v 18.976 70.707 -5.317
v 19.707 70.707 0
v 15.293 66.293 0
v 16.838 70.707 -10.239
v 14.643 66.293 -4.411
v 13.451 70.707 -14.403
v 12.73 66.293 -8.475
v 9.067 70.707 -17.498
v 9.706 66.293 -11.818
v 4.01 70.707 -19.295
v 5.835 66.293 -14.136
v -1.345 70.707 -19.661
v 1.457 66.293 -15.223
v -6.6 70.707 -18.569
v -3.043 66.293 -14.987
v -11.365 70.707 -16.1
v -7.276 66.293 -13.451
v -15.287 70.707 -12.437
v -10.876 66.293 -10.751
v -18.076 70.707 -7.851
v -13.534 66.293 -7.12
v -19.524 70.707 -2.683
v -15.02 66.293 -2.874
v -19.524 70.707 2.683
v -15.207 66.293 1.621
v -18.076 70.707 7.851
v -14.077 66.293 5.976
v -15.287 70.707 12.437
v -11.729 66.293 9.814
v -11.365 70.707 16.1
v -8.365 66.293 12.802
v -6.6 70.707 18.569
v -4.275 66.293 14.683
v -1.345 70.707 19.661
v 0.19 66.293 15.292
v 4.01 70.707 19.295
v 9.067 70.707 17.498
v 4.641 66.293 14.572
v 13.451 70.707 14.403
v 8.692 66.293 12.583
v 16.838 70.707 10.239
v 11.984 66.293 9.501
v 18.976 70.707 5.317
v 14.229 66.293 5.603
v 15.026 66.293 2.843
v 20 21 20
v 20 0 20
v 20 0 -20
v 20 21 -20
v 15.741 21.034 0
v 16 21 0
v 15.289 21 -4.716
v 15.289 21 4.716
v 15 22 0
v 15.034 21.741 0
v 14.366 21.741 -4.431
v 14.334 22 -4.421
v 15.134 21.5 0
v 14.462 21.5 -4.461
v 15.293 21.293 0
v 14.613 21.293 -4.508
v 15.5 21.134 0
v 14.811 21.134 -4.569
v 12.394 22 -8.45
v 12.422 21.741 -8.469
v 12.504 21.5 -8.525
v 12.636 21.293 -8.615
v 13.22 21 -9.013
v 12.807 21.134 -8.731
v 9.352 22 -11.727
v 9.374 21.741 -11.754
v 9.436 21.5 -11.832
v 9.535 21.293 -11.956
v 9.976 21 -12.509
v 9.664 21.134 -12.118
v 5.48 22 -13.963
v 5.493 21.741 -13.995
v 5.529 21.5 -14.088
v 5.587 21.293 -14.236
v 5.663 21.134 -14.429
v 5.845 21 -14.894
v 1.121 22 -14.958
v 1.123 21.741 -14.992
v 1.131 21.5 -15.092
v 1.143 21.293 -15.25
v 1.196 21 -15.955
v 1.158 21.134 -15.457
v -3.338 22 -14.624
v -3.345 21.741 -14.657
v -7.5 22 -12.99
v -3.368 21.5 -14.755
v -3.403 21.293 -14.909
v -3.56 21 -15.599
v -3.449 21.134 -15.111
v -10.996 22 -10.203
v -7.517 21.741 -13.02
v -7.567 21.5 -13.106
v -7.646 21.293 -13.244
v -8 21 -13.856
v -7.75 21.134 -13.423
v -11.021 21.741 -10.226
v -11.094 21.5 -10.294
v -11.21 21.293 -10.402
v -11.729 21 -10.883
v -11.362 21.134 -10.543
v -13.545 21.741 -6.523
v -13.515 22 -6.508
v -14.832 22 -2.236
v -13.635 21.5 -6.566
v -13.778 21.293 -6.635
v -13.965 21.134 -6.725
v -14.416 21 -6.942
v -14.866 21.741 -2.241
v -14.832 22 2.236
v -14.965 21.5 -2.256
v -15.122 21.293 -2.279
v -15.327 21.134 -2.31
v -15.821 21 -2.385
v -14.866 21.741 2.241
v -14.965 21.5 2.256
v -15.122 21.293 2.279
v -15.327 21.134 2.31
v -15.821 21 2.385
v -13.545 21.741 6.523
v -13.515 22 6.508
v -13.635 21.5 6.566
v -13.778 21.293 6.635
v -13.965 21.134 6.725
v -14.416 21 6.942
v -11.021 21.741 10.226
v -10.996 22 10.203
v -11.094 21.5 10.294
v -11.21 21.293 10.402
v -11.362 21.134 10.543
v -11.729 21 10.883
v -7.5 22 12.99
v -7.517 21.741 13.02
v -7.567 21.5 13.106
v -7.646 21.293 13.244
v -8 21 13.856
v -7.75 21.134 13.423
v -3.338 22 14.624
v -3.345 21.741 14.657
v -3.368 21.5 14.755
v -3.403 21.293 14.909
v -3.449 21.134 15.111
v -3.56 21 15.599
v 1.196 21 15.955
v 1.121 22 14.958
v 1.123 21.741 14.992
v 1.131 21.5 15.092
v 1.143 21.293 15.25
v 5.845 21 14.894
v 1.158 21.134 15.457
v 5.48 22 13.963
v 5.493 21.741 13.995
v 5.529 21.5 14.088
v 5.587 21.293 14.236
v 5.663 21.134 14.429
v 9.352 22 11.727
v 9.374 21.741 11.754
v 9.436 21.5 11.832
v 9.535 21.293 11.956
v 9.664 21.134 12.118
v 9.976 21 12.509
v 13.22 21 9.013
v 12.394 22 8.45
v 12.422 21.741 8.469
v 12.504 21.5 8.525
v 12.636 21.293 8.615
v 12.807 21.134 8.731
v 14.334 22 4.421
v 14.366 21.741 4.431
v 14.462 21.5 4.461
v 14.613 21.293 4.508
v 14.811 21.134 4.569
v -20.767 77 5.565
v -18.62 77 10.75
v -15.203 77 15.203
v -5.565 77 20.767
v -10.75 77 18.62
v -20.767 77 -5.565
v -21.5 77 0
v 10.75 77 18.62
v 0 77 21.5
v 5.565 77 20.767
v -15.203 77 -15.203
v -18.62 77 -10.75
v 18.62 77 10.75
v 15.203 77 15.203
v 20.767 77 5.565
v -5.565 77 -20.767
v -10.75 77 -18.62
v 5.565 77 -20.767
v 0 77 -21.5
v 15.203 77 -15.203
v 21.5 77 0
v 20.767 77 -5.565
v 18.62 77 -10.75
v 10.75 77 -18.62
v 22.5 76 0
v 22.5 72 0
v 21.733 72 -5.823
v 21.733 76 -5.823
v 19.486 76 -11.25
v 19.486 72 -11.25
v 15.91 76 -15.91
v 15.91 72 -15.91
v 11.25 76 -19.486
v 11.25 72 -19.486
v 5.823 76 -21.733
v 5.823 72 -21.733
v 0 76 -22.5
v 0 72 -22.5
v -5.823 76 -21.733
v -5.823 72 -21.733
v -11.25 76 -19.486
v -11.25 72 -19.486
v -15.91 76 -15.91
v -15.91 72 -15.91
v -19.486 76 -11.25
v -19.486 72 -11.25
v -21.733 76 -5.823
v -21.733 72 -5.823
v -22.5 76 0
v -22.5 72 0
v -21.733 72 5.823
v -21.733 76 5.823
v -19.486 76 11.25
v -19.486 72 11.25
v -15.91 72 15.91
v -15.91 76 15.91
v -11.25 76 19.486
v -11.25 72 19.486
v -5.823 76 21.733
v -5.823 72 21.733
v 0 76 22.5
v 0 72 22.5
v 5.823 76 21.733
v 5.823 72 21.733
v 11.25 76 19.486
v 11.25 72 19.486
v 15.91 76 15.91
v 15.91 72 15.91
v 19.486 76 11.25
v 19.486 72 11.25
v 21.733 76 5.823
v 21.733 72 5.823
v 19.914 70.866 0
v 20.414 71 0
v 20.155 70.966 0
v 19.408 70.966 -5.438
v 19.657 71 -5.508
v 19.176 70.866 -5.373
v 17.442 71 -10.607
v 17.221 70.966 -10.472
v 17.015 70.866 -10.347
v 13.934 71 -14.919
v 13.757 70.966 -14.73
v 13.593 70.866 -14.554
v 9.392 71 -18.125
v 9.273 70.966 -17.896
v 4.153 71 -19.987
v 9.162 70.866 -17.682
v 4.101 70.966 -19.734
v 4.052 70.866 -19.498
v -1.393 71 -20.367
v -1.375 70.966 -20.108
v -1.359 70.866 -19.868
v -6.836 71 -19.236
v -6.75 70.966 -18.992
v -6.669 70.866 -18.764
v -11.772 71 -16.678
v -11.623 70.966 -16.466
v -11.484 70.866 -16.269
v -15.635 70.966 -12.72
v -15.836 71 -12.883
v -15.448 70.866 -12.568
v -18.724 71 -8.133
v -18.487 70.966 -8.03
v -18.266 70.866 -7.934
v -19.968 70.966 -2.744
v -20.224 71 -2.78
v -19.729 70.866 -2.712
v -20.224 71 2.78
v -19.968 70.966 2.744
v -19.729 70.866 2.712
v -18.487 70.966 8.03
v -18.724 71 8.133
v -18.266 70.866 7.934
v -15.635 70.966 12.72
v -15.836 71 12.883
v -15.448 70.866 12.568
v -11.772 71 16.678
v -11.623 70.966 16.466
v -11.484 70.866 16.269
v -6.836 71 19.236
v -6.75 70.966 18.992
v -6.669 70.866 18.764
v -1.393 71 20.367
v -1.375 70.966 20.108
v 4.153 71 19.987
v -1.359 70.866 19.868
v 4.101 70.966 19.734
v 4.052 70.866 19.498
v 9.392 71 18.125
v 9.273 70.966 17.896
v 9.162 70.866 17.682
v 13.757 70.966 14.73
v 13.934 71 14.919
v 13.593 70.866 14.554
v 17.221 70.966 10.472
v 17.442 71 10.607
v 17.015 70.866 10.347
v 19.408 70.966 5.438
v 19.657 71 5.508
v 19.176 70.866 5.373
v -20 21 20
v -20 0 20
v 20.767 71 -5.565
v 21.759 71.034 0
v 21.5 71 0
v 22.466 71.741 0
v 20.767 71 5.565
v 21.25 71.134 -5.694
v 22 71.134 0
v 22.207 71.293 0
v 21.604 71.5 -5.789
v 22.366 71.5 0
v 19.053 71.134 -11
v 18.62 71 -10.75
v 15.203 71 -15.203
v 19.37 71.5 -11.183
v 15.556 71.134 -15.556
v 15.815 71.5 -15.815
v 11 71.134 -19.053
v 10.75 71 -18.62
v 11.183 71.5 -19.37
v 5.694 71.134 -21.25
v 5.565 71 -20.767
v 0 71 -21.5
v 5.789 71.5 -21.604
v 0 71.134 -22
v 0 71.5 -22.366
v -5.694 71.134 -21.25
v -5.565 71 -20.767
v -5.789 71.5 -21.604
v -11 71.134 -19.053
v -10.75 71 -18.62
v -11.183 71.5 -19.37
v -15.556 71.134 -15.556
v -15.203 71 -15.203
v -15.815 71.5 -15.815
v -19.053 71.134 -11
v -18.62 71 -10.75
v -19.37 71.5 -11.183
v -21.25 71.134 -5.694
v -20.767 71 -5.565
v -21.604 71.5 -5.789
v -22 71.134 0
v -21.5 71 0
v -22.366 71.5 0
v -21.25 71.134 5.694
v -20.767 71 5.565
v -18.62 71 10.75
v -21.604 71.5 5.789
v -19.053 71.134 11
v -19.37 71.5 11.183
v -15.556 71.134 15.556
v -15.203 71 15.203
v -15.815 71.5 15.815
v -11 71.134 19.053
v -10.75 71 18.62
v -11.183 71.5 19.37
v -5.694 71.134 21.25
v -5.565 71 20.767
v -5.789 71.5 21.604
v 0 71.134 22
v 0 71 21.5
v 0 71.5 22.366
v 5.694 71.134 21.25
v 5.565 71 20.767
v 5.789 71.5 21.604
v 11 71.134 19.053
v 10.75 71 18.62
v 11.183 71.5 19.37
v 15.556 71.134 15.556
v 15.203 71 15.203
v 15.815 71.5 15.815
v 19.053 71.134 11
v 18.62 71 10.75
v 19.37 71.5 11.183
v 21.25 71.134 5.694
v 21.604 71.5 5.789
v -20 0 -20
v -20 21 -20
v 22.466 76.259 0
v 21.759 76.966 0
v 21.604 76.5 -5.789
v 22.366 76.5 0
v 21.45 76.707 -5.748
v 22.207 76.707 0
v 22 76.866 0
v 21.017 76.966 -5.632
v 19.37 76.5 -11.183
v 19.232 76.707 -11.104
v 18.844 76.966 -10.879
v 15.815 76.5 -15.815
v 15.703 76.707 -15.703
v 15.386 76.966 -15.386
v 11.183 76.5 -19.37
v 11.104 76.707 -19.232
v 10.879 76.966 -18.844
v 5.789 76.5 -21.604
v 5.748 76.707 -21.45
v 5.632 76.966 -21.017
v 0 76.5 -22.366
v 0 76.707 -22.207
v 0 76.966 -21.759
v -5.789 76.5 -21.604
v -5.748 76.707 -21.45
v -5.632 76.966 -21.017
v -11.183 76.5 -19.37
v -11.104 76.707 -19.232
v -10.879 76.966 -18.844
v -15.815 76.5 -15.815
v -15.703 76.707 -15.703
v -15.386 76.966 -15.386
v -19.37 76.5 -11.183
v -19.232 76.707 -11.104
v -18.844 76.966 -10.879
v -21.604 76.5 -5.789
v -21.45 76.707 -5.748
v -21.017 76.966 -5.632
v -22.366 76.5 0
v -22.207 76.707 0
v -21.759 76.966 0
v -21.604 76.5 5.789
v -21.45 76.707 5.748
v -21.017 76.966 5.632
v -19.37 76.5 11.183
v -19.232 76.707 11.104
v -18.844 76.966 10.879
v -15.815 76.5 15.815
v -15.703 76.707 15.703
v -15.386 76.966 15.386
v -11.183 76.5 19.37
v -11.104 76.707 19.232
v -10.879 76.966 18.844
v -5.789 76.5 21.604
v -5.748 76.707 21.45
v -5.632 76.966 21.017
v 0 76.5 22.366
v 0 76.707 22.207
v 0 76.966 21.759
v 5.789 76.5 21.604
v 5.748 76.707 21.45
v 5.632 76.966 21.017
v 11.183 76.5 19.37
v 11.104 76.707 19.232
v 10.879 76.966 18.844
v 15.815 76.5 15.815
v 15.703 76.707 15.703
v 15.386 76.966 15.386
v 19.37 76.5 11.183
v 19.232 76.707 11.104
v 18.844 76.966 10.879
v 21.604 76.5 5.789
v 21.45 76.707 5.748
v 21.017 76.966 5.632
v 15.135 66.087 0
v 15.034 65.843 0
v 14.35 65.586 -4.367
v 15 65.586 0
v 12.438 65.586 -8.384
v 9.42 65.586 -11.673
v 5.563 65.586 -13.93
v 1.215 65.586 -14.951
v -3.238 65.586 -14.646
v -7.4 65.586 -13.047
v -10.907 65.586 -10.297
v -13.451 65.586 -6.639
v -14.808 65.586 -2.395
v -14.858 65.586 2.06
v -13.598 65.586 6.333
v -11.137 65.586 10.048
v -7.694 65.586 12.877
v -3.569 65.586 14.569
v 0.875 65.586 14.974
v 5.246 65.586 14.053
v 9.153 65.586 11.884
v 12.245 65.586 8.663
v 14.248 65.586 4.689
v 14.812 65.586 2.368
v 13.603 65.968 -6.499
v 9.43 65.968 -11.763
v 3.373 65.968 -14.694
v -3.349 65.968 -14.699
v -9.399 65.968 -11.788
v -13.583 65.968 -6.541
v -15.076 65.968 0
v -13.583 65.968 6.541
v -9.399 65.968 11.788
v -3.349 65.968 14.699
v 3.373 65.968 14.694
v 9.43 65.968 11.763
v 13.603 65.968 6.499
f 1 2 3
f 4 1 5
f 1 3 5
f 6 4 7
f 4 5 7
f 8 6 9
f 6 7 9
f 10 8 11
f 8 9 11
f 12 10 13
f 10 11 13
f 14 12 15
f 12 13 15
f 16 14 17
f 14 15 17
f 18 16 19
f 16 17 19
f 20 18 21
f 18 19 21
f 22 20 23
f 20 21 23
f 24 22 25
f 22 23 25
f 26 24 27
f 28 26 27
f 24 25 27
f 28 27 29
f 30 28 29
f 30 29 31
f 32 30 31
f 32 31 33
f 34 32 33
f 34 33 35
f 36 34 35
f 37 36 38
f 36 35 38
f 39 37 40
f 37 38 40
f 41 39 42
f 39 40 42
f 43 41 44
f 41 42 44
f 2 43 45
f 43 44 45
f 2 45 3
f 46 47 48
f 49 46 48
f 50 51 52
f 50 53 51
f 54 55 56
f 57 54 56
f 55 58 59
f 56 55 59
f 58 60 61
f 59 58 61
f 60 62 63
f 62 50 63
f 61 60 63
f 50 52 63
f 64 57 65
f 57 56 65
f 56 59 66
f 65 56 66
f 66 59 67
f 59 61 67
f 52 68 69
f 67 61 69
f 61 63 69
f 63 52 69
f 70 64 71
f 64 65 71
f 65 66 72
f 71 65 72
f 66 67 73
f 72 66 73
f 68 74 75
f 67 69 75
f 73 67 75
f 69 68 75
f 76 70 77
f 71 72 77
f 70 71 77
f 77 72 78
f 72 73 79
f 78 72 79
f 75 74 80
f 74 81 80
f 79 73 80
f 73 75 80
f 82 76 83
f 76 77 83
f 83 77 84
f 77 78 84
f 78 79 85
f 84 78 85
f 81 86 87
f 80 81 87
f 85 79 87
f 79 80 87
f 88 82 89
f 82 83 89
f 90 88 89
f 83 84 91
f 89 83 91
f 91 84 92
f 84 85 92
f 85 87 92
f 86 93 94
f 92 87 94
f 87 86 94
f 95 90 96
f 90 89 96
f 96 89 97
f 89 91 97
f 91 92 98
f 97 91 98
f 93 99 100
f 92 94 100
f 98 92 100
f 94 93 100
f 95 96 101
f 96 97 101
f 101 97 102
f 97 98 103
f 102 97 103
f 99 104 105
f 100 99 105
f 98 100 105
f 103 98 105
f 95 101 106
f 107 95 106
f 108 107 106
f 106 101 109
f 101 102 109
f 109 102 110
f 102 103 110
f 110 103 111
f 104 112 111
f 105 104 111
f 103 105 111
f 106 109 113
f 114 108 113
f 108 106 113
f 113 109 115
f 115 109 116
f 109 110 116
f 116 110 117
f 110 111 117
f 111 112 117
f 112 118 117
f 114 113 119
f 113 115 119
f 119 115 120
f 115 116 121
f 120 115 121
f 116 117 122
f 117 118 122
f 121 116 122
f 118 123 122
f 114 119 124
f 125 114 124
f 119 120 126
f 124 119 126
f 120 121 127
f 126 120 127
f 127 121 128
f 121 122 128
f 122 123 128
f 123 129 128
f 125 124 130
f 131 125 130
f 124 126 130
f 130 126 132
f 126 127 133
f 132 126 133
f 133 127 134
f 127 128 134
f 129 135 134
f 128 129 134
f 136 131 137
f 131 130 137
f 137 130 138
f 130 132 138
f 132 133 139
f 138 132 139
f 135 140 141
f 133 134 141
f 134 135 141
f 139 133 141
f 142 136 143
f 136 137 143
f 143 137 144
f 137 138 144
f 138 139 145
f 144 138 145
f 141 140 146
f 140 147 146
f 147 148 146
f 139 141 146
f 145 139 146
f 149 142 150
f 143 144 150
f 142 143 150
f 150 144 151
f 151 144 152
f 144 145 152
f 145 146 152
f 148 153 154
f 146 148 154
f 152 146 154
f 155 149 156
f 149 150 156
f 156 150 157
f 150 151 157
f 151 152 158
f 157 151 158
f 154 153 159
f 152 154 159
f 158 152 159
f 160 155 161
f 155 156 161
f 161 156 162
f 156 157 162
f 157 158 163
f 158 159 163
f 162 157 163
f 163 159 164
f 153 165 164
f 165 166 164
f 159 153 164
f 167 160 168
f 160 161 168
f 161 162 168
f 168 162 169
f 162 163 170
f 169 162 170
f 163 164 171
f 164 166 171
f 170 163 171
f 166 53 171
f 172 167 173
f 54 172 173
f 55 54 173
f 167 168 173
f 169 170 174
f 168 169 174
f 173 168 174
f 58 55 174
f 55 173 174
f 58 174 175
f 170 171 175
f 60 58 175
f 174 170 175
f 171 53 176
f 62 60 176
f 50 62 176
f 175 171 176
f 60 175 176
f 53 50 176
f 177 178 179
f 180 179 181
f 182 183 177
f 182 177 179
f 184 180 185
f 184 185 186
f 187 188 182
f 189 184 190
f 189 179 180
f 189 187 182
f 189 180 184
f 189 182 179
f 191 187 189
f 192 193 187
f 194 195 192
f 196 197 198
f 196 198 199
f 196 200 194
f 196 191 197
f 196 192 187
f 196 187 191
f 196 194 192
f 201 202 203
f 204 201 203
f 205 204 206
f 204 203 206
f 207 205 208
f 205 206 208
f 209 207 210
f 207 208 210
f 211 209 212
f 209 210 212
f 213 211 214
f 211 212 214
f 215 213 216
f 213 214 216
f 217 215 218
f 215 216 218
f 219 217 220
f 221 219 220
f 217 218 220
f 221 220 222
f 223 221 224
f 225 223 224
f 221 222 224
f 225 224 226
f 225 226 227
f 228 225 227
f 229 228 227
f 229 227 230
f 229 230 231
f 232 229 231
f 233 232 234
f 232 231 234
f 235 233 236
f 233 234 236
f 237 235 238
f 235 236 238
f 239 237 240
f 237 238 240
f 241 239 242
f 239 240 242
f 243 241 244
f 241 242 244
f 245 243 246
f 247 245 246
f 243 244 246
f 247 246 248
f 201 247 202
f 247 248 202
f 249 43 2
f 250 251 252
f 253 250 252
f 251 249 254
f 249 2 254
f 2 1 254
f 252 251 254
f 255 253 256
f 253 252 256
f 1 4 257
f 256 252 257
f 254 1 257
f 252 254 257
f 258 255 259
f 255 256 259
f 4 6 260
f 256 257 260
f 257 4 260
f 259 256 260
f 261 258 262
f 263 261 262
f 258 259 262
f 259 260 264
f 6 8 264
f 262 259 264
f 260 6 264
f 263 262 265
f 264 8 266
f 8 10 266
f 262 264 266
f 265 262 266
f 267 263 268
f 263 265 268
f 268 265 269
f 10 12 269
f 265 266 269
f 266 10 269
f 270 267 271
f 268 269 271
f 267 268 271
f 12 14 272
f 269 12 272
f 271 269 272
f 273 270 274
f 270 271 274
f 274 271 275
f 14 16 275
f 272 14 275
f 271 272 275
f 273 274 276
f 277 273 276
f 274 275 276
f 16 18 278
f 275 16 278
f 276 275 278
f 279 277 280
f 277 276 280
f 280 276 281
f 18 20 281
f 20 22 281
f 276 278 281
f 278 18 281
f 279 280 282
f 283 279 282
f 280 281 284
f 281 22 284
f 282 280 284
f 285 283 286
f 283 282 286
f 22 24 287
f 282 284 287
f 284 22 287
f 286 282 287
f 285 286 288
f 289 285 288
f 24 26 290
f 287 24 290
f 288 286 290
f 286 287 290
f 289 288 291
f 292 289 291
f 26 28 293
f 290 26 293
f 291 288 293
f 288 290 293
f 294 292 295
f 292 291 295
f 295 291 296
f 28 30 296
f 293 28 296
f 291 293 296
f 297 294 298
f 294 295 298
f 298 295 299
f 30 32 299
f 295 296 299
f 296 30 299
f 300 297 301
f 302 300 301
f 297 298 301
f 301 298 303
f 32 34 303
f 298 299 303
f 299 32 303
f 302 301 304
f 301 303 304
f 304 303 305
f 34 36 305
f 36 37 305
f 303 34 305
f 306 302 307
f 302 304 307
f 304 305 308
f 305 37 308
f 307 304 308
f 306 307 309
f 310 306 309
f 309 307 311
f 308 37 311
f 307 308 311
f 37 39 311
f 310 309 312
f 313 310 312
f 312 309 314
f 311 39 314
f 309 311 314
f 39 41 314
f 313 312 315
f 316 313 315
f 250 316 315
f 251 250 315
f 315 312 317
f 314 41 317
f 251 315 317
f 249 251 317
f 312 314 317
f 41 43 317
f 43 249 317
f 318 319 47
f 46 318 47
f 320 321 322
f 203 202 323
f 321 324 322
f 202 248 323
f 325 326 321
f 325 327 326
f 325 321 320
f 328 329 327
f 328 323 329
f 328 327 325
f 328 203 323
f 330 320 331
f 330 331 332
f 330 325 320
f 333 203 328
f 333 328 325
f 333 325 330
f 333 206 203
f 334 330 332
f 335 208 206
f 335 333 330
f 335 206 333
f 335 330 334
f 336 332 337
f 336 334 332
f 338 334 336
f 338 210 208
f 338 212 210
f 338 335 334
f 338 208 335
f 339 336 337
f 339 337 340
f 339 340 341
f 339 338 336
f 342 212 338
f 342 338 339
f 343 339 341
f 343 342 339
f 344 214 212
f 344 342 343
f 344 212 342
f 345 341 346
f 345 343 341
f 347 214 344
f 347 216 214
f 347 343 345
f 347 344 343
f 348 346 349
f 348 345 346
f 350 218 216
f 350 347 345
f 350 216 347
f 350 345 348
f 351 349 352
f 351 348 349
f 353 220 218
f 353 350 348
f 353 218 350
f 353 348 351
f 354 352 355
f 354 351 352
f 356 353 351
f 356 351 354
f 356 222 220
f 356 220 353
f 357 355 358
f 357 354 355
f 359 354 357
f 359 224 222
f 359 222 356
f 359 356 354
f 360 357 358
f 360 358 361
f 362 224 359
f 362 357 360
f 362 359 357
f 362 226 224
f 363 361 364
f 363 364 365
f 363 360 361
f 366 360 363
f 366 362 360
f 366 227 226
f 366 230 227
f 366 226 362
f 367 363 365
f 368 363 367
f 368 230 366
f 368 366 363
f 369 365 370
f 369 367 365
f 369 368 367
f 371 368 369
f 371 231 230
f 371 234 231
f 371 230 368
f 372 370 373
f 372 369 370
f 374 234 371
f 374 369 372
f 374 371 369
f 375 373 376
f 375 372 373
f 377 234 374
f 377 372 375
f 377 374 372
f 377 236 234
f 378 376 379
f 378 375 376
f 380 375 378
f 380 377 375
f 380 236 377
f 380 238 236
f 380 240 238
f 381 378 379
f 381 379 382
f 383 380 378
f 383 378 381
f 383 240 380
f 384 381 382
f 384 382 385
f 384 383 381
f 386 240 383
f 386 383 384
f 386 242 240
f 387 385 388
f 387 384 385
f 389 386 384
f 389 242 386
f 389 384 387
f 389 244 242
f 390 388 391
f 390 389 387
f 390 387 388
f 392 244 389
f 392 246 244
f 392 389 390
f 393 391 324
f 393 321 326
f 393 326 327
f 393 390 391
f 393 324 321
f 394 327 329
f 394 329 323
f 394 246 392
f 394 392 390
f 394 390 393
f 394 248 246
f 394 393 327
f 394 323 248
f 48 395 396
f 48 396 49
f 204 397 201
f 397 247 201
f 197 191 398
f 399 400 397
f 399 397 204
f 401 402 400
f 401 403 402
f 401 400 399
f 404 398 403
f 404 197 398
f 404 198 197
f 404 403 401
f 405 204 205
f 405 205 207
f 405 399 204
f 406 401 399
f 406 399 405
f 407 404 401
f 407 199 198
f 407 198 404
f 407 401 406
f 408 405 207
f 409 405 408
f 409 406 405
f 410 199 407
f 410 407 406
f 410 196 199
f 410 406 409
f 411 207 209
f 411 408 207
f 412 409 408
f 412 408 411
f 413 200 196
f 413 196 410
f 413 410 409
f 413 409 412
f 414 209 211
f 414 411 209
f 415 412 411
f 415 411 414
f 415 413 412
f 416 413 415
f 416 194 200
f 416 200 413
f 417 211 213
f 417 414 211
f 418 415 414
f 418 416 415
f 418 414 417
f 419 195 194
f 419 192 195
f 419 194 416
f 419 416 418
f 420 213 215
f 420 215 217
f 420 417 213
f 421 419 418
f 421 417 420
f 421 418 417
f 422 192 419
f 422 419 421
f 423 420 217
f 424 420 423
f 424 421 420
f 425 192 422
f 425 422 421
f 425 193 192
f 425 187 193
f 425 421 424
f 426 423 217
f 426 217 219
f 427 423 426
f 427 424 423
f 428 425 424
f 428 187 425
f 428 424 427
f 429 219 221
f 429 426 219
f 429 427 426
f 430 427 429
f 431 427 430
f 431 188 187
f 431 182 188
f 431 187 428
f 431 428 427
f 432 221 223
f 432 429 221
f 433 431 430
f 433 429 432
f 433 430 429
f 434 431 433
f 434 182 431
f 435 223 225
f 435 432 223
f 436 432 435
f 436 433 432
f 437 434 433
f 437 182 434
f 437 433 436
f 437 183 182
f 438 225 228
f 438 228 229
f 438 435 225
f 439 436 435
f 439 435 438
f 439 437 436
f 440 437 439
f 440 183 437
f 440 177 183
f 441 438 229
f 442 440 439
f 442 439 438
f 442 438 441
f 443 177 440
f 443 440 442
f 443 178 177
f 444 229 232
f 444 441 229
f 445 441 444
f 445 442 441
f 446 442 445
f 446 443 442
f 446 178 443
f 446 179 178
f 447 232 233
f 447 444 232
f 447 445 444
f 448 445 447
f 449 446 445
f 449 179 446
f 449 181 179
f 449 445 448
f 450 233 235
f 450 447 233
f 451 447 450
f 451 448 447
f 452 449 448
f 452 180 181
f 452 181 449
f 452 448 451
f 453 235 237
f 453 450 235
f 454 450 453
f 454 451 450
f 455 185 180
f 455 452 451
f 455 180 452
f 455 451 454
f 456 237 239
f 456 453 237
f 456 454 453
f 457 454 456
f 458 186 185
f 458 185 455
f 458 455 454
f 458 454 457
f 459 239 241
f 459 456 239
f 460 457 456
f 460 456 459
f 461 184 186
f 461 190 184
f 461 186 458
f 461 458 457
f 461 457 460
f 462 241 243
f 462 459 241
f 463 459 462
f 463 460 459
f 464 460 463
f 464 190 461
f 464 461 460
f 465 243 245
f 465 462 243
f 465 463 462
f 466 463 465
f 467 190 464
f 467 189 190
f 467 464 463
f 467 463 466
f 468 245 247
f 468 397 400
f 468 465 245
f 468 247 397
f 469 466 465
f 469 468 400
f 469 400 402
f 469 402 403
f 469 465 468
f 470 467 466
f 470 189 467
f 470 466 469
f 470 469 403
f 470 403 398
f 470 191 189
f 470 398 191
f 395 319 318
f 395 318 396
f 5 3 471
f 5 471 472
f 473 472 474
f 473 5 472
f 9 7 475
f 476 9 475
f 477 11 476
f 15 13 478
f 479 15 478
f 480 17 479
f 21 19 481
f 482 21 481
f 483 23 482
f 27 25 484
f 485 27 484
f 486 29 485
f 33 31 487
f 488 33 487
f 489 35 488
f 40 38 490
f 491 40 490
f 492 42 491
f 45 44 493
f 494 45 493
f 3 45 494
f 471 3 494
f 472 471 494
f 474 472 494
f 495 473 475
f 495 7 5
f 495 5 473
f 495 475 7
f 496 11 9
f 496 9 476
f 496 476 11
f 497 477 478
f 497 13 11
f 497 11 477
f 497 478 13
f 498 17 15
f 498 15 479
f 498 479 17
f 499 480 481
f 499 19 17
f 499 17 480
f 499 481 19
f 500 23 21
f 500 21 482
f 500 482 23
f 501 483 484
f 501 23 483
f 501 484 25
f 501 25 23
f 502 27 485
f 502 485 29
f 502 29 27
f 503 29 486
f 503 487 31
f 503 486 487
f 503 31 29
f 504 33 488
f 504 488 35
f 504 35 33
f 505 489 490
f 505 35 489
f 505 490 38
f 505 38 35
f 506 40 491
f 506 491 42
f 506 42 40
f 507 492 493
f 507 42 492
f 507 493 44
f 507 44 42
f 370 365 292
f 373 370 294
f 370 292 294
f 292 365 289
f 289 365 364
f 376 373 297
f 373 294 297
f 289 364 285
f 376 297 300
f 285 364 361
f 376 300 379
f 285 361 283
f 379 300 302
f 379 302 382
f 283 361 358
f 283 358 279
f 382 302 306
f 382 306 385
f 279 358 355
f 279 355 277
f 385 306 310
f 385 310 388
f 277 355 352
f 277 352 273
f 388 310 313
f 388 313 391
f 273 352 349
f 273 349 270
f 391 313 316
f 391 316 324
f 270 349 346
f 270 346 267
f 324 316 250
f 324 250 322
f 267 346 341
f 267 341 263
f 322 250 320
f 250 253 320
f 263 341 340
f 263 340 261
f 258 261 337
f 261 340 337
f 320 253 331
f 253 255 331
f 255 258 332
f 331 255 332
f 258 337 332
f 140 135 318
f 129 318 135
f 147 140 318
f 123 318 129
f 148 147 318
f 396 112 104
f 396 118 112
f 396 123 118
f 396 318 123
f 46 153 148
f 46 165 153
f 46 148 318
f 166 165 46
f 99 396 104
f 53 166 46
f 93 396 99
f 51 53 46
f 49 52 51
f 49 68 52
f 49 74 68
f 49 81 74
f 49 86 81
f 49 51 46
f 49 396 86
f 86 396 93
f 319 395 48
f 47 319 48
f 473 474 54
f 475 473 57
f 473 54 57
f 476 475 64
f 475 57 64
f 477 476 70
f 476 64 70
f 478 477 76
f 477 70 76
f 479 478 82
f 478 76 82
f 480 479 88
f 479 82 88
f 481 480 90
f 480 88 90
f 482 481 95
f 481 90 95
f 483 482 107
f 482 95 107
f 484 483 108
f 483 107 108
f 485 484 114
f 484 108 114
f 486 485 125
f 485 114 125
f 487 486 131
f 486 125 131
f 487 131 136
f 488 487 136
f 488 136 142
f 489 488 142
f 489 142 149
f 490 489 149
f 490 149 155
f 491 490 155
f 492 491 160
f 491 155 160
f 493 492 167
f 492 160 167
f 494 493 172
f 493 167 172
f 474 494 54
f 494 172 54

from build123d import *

# Parameters (mm, degrees)
SKETCH_2_W      = 40
SKETCH_2_H      = 40
EXTRUDE_1_DEPTH = 21
SKETCH_3_R      = 15
EXTRUDE_2_DEPTH = 50
SKETCH_4_R      = 22.5
EXTRUDE_3_DEPTH = 6
CHAMFER_1_SIZE  = 5
FILLET_1_R      = 1


with BuildPart() as part:
    # 草图2 → 凸台-拉伸1 (new body)
    with BuildSketch(Plane(origin=(0, 0, 0), x_dir=(1, 0, 0), z_dir=(0, 1, 0))):
        Rectangle(SKETCH_2_W, SKETCH_2_H)
    extrude(amount=EXTRUDE_1_DEPTH)

    # 草图3 → 凸台-拉伸2 (add)
    with BuildSketch(Plane(origin=(0, 21, 0), x_dir=(1, 0, 0), z_dir=(0, 1, 0))):
        Circle(SKETCH_3_R)
    extrude(amount=EXTRUDE_2_DEPTH)

    # 草图4 → 凸台-拉伸3 (add)
    with BuildSketch(Plane(origin=(0, 71, 0), x_dir=(1, 0, 0), z_dir=(0, 1, 0))):
        Circle(SKETCH_4_R)
    extrude(amount=EXTRUDE_3_DEPTH)

    # 倒角1
    chamfer_1_edges = [part.edges().sort_by_distance(p)[0] for p in [
        (-15, 71, 0),
    ]]
    chamfer(chamfer_1_edges, length=CHAMFER_1_SIZE)

    # 圆角1
    fillet_1_edges = [part.edges().sort_by_distance(p)[0] for p in [
        (-15, 21, 0),
        (-22.5, 71, 0),
        (-22.5, 77, 0),
        (-20, 71, 0),
        (-15, 66, 0),
    ]]
    fillet(fillet_1_edges, radius=FILLET_1_R)


solid = part.part
